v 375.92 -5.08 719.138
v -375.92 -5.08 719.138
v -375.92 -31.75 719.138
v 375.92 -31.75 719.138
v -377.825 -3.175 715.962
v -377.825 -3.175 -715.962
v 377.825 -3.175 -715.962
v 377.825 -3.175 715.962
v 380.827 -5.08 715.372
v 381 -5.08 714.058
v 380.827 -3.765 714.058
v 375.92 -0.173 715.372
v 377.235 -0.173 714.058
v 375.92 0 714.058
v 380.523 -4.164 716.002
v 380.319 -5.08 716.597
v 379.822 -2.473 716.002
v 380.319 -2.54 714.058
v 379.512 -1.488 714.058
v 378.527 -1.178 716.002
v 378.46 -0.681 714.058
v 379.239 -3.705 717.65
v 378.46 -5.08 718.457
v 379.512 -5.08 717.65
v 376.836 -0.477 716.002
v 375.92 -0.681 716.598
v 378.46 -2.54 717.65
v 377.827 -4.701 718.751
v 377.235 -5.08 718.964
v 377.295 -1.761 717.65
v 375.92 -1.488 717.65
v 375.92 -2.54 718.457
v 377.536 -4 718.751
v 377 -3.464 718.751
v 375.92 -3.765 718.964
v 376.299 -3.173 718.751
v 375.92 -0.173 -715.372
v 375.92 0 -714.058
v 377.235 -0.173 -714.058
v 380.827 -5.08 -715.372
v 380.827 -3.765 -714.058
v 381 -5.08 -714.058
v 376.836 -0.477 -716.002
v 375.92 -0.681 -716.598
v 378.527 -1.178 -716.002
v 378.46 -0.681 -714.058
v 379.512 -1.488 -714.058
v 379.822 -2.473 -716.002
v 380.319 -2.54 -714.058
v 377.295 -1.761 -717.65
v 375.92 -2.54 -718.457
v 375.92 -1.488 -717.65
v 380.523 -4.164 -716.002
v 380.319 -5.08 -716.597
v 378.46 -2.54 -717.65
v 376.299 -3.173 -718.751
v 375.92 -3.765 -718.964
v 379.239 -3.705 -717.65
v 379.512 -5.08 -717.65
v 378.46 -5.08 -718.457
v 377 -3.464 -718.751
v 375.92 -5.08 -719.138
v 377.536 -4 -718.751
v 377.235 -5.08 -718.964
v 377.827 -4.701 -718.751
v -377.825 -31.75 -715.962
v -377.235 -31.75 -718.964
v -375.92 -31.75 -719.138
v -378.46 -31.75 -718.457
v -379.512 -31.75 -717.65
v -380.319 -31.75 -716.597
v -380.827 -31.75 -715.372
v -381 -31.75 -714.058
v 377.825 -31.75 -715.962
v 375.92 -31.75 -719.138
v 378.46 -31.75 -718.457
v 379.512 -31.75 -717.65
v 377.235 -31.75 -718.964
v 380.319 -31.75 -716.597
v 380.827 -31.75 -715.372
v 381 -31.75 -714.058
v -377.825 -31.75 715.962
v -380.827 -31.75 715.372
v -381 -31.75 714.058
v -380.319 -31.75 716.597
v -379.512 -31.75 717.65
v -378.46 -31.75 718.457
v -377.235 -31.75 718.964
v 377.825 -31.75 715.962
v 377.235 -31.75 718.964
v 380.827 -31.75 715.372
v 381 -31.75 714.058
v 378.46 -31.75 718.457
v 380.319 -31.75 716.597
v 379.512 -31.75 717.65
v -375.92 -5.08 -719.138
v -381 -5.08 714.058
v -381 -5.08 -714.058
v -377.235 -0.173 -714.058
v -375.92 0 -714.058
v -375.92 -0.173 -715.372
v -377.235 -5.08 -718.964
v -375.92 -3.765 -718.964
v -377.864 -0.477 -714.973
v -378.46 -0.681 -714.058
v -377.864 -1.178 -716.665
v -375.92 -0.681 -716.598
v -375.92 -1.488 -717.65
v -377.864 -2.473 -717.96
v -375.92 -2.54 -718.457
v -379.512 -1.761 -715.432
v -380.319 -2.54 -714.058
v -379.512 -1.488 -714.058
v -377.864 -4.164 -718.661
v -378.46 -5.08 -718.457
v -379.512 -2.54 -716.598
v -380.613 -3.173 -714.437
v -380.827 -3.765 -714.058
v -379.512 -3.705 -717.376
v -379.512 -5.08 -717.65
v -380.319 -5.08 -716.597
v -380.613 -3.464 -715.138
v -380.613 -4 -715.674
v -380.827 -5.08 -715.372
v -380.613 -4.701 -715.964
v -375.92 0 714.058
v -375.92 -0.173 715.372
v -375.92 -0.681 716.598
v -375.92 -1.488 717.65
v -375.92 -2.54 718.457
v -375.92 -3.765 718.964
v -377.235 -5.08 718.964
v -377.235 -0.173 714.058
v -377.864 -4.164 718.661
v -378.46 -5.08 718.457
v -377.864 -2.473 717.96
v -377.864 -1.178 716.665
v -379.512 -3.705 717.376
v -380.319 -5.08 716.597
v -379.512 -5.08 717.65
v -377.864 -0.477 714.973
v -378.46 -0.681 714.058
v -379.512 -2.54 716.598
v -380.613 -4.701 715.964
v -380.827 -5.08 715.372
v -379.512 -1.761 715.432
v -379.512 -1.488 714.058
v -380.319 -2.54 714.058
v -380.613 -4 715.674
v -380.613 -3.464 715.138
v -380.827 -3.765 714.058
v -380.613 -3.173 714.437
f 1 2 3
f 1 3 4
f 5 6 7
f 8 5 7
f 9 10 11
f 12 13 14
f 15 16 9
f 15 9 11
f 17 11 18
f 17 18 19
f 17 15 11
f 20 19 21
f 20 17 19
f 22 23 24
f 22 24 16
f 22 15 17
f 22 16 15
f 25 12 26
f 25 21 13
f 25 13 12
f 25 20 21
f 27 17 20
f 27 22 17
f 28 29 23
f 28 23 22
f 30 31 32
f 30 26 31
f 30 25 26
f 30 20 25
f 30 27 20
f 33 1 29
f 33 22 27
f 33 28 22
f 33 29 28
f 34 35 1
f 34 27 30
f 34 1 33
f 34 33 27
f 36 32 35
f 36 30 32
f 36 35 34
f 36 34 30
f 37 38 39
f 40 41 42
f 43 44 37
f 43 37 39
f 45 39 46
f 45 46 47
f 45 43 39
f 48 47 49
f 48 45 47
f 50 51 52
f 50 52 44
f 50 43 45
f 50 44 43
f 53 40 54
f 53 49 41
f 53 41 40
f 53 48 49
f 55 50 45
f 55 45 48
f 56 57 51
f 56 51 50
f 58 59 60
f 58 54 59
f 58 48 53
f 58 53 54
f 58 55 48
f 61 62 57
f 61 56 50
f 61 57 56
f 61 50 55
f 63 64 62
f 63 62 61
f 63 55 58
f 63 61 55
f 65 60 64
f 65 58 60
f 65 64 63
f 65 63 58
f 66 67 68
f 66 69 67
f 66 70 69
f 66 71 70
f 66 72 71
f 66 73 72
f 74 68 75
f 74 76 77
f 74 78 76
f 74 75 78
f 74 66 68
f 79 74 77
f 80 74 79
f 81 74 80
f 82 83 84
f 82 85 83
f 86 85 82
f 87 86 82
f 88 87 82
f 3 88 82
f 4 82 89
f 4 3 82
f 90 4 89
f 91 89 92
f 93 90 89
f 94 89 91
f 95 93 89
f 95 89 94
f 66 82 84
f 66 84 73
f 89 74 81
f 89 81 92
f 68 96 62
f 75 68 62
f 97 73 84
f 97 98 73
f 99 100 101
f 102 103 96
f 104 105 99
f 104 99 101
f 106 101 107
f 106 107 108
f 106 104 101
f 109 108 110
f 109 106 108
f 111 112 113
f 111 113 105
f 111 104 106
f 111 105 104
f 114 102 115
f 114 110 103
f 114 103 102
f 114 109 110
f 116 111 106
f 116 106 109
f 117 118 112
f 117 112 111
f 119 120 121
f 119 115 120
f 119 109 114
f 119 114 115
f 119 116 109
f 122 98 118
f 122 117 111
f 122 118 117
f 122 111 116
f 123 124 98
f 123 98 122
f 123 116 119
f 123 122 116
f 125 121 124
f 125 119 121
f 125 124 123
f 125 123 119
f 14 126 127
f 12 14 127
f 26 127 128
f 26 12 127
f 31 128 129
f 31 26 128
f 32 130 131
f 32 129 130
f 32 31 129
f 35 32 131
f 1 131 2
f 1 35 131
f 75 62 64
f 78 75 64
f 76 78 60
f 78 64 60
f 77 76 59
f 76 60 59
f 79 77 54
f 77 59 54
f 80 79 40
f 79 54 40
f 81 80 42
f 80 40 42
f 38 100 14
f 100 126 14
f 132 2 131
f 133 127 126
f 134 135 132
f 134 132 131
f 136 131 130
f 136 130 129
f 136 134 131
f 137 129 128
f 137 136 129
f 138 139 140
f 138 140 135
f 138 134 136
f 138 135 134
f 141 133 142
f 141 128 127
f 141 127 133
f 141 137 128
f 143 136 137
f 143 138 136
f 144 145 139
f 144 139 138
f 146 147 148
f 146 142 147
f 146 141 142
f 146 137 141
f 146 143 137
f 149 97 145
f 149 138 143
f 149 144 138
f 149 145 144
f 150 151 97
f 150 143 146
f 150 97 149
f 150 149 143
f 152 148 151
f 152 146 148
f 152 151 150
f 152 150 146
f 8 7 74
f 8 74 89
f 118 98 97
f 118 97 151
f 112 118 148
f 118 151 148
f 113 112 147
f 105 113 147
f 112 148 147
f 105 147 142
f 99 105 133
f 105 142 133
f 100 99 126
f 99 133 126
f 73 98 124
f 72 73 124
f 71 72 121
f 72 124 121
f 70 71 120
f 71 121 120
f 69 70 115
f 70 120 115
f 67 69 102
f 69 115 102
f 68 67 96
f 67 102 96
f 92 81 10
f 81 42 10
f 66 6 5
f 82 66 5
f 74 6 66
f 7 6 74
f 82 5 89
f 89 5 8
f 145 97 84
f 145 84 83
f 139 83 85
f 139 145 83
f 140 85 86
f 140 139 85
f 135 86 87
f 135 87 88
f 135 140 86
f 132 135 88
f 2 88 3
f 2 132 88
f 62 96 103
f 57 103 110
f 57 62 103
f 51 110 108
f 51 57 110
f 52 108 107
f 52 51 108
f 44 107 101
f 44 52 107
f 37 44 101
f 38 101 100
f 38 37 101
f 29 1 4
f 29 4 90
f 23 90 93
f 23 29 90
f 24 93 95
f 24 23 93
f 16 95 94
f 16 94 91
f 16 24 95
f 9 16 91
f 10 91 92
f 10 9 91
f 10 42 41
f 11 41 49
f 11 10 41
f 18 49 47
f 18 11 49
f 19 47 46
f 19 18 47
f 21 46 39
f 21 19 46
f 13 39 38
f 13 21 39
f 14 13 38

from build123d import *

# Parameters (mm, degrees)
F0_W         = 762
F0_H         = 1438.275
F1_DEPTH     = 3.175
F2_W         = 762
F2_H         = 1438.275
F2_W_2       = 755.65
F2_H_2       = 1431.925
F3_DEPTH     = 28.575
F4_R         = 5.08
F5_T1_DEPTH  = 39.37
F5_S5_W      = 5.1816
F5_S5_H      = 5.1816
F5_T6_DEPTH  = 5.1816
F5_S11_W     = 5.1816
F5_S11_H     = 5.1816
F5_T12_DEPTH = 5.1816
F5_S17_W     = 5.1816
F5_S17_H     = 5.1816
F5_T18_DEPTH = 5.1816
F5_S23_W     = 5.1816
F5_S23_H     = 5.1816
F5_T24_DEPTH = 5.1816


# Not quite as in the source:
# - a fillet or chamfer that OpenCascade refuses, or shapes differently, is made with other operations: its cross-section is extruded or revolved along the edge and cut away or added


with BuildPart() as f1:
    # F0 (on Front) → F1 (new body)
    with BuildSketch(Plane.XZ):
        Rectangle(F0_W, F0_H)
    extrude(amount=F1_DEPTH)

    # F2 (on face) → F3 (join)
    with BuildSketch(Plane.XZ.offset(3.175)):
        Rectangle(F2_W, F2_H)
        Rectangle(F2_W_2, F2_H_2, mode=Mode.SUBTRACT)
    extrude(amount=F3_DEPTH)

    # F4
    f4_edges = [f1.edges().sort_by_distance(p)[0] for p in [
        (0, 0, -719.1375),
        (381, 0, 0),
        (-381, 0, 0),
        (0, 0, 719.1375),
    ]]
    fillet(f4_edges, radius=F4_R)

    # F5: fillet of radius 5.08 on 4 edges, made by hand

    # F5_s2 → F5_t1 (cut)
    with BuildSketch(Plane.XZ.offset(5.08)):
        with BuildLine():
            ThreePointArc((-381, 714.0575), (-379.5121024484, 717.6496024484), (-375.92, 719.1375))
            Line((-375.92, 719.1375), (-381, 719.1375))
            Line((-381, 719.1375), (-381, 714.0575))
        make_face()
        with BuildLine():
            ThreePointArc((375.92, 719.1375), (379.5121024484, 717.6496024484), (381, 714.0575))
            Line((381, 714.0575), (381, 719.1375))
            Line((381, 719.1375), (375.92, 719.1375))
        make_face()
        with BuildLine():
            ThreePointArc((375.92, -719.1375), (379.5121024484, -717.6496024484), (381, -714.0575))
            Line((381, -714.0575), (381, -719.1375))
            Line((381, -719.1375), (375.92, -719.1375))
        make_face()
        with BuildLine():
            ThreePointArc((-381, -714.0575), (-379.5121024484, -717.6496024484), (-375.92, -719.1375))
            Line((-375.92, -719.1375), (-381, -719.1375))
            Line((-381, -719.1375), (-381, -714.0575))
        make_face()
    extrude(amount=F5_T1_DEPTH, mode=Mode.SUBTRACT)


with BuildPart() as f5_tool4:
    # F5_s5 → F5_t6 (new body)
    with BuildSketch(Plane.YZ.offset(-375.92)):
        with Locations((-2.4892, -716.6483)):
            Rectangle(F5_S5_W, F5_S5_H)
    extrude(amount=-F5_T6_DEPTH)

    # F5_s7 → F5_t8 (revolve, cut)
    with BuildSketch(Plane(origin=(-375.92, -5.08, -714.0575), x_dir=(0, -0.7071067812, 0.7071067812), z_dir=(0, -0.7071067812, -0.7071067812))):
        with BuildLine():
            ThreePointArc((0, -5.08), (5.08, 0), (0, 5.08))
            Line((0, 5.08), (0, -5.08))
        make_face()
    revolve(axis=Axis((-375.92, -5.08, -714.0575), (-1, 0, 0)), mode=Mode.SUBTRACT)


with BuildPart() as f1_1:
    add(f1.part)

    # F5_t3: cut F5_tool4
    add(f5_tool4.part, mode=Mode.SUBTRACT)


with BuildPart() as f5_tool10:
    # F5_s11 → F5_t12 (new body)
    with BuildSketch(Plane.XY.offset(-714.0575)):
        with Locations((378.5108, -2.4892)):
            Rectangle(F5_S11_W, F5_S11_H)
    extrude(amount=-F5_T12_DEPTH)

    # F5_s13 → F5_t14 (revolve, cut)
    with BuildSketch(Plane(origin=(375.92, -5.08, -714.0575), x_dir=(-0.7071067812, -0.7071067812, 0), z_dir=(0.7071067812, -0.7071067812, 0))):
        with BuildLine():
            ThreePointArc((0, -5.08), (5.08, 0), (0, 5.08))
            Line((0, 5.08), (0, -5.08))
        make_face()
    revolve(axis=Axis((375.92, -5.08, -714.0575), (0, 0, -1)), mode=Mode.SUBTRACT)


with BuildPart() as f1_2:
    add(f1_1.part)

    # F5_t9: cut F5_tool10
    add(f5_tool10.part, mode=Mode.SUBTRACT)


with BuildPart() as f5_tool16:
    # F5_s17 → F5_t18 (new body)
    with BuildSketch(Plane.XY.offset(714.0575)):
        with Locations((378.5108, -2.4892)):
            Rectangle(F5_S17_W, F5_S17_H)
    extrude(amount=F5_T18_DEPTH)

    # F5_s19 → F5_t20 (revolve, cut)
    with BuildSketch(Plane(origin=(375.92, -5.08, 714.0575), x_dir=(-0.7071067812, -0.7071067812, 0), z_dir=(-0.7071067812, 0.7071067812, 0))):
        with BuildLine():
            ThreePointArc((0, -5.08), (5.08, 0), (0, 5.08))
            Line((0, 5.08), (0, -5.08))
        make_face()
    revolve(axis=Axis((375.92, -5.08, 714.0575), (0, 0, 1)), mode=Mode.SUBTRACT)


with BuildPart() as f1_3:
    add(f1_2.part)

    # F5_t15: cut F5_tool16
    add(f5_tool16.part, mode=Mode.SUBTRACT)


with BuildPart() as f5_tool22:
    # F5_s23 → F5_t24 (new body)
    with BuildSketch(Plane.YZ.offset(-375.92)):
        with Locations((-2.4892, 716.6483)):
            Rectangle(F5_S23_W, F5_S23_H)
    extrude(amount=-F5_T24_DEPTH)

    # F5_s25 → F5_t26 (revolve, cut)
    with BuildSketch(Plane(origin=(-375.92, -5.08, 714.0575), x_dir=(0, -0.7071067812, -0.7071067812), z_dir=(0, 0.7071067812, -0.7071067812))):
        with BuildLine():
            ThreePointArc((0, -5.08), (5.08, 0), (0, 5.08))
            Line((0, 5.08), (0, -5.08))
        make_face()
    revolve(axis=Axis((-375.92, -5.08, 714.0575), (-1, 0, 0)), mode=Mode.SUBTRACT)


with BuildPart() as f1_4:
    add(f1_3.part)

    # F5_t21: cut F5_tool22
    add(f5_tool22.part, mode=Mode.SUBTRACT)


solid = f1_4.part
